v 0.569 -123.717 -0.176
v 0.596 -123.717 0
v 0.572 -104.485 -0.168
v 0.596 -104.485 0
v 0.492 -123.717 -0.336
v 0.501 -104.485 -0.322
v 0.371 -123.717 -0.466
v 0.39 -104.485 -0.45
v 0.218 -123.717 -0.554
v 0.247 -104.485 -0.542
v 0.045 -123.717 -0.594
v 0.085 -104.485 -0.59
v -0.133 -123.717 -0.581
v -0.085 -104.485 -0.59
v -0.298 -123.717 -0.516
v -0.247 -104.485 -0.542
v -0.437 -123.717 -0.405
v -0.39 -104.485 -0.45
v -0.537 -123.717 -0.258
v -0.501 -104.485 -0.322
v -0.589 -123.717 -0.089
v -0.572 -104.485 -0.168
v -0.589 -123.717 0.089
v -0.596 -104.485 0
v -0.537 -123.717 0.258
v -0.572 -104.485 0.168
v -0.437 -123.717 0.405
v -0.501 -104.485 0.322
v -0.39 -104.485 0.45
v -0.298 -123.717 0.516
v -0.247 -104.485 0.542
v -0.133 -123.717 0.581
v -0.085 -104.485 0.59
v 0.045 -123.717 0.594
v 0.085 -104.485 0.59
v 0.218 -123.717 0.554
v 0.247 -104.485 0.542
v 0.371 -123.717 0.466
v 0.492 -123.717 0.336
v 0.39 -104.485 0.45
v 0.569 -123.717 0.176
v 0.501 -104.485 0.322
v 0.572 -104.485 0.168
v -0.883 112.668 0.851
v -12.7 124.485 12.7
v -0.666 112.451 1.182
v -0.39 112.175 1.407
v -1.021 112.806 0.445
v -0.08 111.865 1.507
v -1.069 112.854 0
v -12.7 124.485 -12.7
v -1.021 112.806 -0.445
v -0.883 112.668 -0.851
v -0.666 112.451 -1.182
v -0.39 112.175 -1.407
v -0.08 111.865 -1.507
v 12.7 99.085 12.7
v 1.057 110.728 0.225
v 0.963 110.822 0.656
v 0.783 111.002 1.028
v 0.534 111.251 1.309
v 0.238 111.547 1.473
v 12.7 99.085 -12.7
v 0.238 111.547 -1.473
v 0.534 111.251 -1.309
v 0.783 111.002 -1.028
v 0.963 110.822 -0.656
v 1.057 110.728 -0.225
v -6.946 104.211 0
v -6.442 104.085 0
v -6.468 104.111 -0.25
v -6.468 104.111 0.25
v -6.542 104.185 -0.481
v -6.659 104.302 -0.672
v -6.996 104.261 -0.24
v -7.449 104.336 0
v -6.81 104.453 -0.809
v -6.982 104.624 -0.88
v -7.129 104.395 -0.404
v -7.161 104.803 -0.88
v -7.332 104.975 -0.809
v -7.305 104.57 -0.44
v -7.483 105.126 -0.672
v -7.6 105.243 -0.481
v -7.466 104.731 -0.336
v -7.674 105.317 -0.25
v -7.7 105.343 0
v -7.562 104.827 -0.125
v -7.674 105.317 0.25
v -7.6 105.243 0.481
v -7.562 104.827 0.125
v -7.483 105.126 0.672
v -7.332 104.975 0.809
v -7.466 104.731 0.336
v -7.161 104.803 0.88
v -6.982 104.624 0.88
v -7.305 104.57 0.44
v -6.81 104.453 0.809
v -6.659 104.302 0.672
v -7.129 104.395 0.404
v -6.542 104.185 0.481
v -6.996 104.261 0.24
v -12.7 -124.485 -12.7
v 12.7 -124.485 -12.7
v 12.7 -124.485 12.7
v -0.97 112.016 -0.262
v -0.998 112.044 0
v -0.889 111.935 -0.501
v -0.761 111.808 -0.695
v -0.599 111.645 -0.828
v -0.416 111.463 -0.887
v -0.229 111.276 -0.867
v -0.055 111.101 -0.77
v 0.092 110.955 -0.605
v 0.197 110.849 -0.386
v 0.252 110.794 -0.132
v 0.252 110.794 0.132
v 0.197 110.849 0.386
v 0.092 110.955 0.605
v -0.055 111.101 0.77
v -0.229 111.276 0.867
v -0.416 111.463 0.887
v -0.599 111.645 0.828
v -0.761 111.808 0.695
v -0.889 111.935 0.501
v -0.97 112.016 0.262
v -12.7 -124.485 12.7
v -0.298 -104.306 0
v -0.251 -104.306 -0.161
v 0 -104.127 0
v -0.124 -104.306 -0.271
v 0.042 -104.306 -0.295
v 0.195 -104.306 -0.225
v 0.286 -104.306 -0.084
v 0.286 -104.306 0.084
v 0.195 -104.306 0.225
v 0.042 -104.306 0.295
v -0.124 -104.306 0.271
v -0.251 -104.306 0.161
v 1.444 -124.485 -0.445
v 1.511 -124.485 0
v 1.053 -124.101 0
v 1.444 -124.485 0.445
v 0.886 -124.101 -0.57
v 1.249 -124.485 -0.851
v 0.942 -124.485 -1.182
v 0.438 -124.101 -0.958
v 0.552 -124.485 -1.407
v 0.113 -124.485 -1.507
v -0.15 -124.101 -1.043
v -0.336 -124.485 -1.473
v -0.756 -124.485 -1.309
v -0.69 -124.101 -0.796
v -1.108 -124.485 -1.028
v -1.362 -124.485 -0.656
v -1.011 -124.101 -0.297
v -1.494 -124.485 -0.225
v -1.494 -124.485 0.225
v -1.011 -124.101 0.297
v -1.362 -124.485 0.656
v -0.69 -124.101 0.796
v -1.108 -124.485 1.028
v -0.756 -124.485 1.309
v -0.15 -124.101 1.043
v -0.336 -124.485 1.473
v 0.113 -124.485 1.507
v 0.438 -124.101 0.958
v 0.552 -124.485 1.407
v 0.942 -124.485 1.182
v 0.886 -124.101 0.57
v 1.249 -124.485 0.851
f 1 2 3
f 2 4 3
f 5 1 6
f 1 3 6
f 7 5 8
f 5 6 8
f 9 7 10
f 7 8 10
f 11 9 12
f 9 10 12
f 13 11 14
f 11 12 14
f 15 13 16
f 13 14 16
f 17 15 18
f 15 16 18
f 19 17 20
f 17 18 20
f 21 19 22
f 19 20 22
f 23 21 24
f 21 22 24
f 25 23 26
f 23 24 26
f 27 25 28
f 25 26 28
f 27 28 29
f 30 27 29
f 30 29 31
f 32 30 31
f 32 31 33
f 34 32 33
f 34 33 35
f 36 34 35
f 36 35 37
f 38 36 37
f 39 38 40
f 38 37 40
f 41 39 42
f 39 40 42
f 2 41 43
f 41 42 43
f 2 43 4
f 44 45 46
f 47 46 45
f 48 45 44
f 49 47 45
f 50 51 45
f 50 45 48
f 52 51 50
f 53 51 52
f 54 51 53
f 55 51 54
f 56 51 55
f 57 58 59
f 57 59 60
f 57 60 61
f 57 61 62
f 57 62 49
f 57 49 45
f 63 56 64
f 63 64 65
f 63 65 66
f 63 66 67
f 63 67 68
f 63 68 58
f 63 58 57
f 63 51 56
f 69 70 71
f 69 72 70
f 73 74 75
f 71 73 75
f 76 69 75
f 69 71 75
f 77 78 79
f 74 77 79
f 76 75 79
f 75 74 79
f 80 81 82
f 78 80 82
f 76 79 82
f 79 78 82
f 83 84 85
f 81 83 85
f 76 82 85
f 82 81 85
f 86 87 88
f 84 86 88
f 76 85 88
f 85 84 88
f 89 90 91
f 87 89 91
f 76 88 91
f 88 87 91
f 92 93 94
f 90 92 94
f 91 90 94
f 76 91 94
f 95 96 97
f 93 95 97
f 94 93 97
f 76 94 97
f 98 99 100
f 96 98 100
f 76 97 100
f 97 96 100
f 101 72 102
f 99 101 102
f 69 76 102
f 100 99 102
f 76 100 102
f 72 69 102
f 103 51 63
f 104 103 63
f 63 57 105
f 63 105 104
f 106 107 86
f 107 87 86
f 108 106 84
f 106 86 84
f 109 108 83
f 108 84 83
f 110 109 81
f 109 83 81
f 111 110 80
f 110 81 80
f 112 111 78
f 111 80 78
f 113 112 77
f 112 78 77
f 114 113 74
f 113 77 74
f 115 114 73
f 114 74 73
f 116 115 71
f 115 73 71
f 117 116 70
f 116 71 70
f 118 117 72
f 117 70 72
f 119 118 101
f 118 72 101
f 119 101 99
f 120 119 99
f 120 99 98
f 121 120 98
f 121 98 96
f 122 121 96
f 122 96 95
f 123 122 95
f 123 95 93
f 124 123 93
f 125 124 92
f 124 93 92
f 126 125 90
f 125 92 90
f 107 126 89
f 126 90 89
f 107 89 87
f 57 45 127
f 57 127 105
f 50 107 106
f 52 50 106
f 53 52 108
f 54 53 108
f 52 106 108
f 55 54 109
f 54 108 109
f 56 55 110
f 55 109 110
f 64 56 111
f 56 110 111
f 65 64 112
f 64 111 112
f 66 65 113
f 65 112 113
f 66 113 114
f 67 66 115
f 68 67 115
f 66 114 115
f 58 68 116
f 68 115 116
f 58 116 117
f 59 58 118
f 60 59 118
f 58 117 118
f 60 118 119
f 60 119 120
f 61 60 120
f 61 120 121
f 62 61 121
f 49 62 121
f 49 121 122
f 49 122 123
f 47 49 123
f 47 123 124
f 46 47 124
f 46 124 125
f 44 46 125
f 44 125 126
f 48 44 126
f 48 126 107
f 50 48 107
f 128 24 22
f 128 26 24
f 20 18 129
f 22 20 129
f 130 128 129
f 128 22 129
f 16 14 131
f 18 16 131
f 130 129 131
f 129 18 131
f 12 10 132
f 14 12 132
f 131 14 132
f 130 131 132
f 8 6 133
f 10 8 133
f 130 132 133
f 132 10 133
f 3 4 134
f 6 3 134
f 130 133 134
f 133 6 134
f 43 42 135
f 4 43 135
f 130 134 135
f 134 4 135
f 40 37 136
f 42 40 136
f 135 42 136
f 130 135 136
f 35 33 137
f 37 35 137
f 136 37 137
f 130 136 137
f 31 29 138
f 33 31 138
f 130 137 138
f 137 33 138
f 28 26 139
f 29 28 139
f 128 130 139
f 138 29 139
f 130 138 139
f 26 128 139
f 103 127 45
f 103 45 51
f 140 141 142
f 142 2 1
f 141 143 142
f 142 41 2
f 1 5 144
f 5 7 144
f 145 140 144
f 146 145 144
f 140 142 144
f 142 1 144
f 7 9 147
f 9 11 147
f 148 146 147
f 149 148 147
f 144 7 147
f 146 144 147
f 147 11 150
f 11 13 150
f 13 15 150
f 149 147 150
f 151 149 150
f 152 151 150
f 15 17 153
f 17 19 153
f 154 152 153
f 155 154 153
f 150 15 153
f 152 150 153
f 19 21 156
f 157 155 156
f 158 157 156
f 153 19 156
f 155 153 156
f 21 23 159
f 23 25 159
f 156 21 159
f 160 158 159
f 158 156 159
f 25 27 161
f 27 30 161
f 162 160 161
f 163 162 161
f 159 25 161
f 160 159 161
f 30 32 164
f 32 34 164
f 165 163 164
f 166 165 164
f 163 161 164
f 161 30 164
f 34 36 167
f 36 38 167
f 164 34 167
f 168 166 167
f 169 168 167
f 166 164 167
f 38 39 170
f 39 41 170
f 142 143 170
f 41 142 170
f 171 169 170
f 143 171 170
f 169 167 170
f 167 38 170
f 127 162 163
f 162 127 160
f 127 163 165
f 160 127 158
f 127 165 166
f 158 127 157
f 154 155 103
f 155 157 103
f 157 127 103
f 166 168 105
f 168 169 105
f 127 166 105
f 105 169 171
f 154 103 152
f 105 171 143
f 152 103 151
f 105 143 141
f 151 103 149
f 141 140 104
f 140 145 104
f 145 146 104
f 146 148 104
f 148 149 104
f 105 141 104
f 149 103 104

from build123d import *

# Parameters (mm, degrees)
SKETCH1_W                                         = 25.4
SKETCH1_H                                         = 25.4
BOSS_EXTRUDE1_DEPTH                               = 124.485
F_0_80_TAPPED_HOLE1_D                             = 1.19126
F_0_80_TAPPED_HOLE1_DEPTH                         = 20
F_0_80_TAPPED_HOLE1_CSINK_D                       = 3.0226
F_0_80_TAPPED_HOLE1_CSINK_ANGLE                   = 100
F_0_80_TAPPED_HOLE1_TIP                           = 0.357890611
CUT_EXTRUDE1_DEPTH                                = 13.7
CUT_EXTRUDE1_DEPTH_BACK                           = 13.7
CSK_FOR_0_FLAT_HEAD_MACHINE_SCREW_100_D           = 1.778
CSK_FOR_0_FLAT_HEAD_MACHINE_SCREW_100_DEPTH       = 10
CSK_FOR_0_FLAT_HEAD_MACHINE_SCREW_100_CSINK_D     = 3.0226
CSK_FOR_0_FLAT_HEAD_MACHINE_SCREW_100_CSINK_ANGLE = 100
CSK_FOR_0_FLAT_HEAD_MACHINE_SCREW_100_TIP         = 0.53416509


with BuildPart() as part:
    # Sketch1 → Boss-Extrude1 (new body, symmetric)
    with BuildSketch(Plane(origin=(0, 0, 0), x_dir=(1, 0, 0), z_dir=(0, 1, 0))):
        Rectangle(SKETCH1_W, SKETCH1_H)
    extrude(amount=BOSS_EXTRUDE1_DEPTH, both=True)

    # #0-80 Tapped Hole1
    with Locations(Plane(origin=(0, -124.485, 0), x_dir=(-1, 0, 0), z_dir=(0, -1, 0))):
        with Locations((0, 0)):
            CounterSinkHole(F_0_80_TAPPED_HOLE1_D / 2, F_0_80_TAPPED_HOLE1_CSINK_D / 2, depth=F_0_80_TAPPED_HOLE1_DEPTH, counter_sink_angle=F_0_80_TAPPED_HOLE1_CSINK_ANGLE)
            with Locations((0, 0, -(F_0_80_TAPPED_HOLE1_DEPTH + F_0_80_TAPPED_HOLE1_TIP / 2))):  # 118° drill point
                Cone(0, F_0_80_TAPPED_HOLE1_D / 2, F_0_80_TAPPED_HOLE1_TIP, mode=Mode.SUBTRACT)

    # Sketch4 → Cut-Extrude1 (cut, two sides)
    with BuildSketch(Plane.XY) as cut_extrude1_sk:
        Polygon((12.7, 124.485), (-12.7, 124.485), (12.7, 99.085), align=None)
    extrude(amount=CUT_EXTRUDE1_DEPTH, mode=Mode.SUBTRACT)
    extrude(cut_extrude1_sk.sketch, amount=-CUT_EXTRUDE1_DEPTH_BACK, mode=Mode.SUBTRACT)

    # CSK for #0 Flat Head Machine Screw (100)1
    with Locations(Plane(origin=(55.8925, 55.8925, 0), x_dir=(0.707106781, -0.707106781, 0), z_dir=(0.707106781, 0.707106781, 0))):
        with Locations((-79.043931535, 0)):
            CounterSinkHole(CSK_FOR_0_FLAT_HEAD_MACHINE_SCREW_100_D / 2, CSK_FOR_0_FLAT_HEAD_MACHINE_SCREW_100_CSINK_D / 2, depth=CSK_FOR_0_FLAT_HEAD_MACHINE_SCREW_100_DEPTH, counter_sink_angle=CSK_FOR_0_FLAT_HEAD_MACHINE_SCREW_100_CSINK_ANGLE)
            with Locations((0, 0, -(CSK_FOR_0_FLAT_HEAD_MACHINE_SCREW_100_DEPTH + CSK_FOR_0_FLAT_HEAD_MACHINE_SCREW_100_TIP / 2))):  # 118° drill point
                Cone(0, CSK_FOR_0_FLAT_HEAD_MACHINE_SCREW_100_D / 2, CSK_FOR_0_FLAT_HEAD_MACHINE_SCREW_100_TIP, mode=Mode.SUBTRACT)


solid = part.part
